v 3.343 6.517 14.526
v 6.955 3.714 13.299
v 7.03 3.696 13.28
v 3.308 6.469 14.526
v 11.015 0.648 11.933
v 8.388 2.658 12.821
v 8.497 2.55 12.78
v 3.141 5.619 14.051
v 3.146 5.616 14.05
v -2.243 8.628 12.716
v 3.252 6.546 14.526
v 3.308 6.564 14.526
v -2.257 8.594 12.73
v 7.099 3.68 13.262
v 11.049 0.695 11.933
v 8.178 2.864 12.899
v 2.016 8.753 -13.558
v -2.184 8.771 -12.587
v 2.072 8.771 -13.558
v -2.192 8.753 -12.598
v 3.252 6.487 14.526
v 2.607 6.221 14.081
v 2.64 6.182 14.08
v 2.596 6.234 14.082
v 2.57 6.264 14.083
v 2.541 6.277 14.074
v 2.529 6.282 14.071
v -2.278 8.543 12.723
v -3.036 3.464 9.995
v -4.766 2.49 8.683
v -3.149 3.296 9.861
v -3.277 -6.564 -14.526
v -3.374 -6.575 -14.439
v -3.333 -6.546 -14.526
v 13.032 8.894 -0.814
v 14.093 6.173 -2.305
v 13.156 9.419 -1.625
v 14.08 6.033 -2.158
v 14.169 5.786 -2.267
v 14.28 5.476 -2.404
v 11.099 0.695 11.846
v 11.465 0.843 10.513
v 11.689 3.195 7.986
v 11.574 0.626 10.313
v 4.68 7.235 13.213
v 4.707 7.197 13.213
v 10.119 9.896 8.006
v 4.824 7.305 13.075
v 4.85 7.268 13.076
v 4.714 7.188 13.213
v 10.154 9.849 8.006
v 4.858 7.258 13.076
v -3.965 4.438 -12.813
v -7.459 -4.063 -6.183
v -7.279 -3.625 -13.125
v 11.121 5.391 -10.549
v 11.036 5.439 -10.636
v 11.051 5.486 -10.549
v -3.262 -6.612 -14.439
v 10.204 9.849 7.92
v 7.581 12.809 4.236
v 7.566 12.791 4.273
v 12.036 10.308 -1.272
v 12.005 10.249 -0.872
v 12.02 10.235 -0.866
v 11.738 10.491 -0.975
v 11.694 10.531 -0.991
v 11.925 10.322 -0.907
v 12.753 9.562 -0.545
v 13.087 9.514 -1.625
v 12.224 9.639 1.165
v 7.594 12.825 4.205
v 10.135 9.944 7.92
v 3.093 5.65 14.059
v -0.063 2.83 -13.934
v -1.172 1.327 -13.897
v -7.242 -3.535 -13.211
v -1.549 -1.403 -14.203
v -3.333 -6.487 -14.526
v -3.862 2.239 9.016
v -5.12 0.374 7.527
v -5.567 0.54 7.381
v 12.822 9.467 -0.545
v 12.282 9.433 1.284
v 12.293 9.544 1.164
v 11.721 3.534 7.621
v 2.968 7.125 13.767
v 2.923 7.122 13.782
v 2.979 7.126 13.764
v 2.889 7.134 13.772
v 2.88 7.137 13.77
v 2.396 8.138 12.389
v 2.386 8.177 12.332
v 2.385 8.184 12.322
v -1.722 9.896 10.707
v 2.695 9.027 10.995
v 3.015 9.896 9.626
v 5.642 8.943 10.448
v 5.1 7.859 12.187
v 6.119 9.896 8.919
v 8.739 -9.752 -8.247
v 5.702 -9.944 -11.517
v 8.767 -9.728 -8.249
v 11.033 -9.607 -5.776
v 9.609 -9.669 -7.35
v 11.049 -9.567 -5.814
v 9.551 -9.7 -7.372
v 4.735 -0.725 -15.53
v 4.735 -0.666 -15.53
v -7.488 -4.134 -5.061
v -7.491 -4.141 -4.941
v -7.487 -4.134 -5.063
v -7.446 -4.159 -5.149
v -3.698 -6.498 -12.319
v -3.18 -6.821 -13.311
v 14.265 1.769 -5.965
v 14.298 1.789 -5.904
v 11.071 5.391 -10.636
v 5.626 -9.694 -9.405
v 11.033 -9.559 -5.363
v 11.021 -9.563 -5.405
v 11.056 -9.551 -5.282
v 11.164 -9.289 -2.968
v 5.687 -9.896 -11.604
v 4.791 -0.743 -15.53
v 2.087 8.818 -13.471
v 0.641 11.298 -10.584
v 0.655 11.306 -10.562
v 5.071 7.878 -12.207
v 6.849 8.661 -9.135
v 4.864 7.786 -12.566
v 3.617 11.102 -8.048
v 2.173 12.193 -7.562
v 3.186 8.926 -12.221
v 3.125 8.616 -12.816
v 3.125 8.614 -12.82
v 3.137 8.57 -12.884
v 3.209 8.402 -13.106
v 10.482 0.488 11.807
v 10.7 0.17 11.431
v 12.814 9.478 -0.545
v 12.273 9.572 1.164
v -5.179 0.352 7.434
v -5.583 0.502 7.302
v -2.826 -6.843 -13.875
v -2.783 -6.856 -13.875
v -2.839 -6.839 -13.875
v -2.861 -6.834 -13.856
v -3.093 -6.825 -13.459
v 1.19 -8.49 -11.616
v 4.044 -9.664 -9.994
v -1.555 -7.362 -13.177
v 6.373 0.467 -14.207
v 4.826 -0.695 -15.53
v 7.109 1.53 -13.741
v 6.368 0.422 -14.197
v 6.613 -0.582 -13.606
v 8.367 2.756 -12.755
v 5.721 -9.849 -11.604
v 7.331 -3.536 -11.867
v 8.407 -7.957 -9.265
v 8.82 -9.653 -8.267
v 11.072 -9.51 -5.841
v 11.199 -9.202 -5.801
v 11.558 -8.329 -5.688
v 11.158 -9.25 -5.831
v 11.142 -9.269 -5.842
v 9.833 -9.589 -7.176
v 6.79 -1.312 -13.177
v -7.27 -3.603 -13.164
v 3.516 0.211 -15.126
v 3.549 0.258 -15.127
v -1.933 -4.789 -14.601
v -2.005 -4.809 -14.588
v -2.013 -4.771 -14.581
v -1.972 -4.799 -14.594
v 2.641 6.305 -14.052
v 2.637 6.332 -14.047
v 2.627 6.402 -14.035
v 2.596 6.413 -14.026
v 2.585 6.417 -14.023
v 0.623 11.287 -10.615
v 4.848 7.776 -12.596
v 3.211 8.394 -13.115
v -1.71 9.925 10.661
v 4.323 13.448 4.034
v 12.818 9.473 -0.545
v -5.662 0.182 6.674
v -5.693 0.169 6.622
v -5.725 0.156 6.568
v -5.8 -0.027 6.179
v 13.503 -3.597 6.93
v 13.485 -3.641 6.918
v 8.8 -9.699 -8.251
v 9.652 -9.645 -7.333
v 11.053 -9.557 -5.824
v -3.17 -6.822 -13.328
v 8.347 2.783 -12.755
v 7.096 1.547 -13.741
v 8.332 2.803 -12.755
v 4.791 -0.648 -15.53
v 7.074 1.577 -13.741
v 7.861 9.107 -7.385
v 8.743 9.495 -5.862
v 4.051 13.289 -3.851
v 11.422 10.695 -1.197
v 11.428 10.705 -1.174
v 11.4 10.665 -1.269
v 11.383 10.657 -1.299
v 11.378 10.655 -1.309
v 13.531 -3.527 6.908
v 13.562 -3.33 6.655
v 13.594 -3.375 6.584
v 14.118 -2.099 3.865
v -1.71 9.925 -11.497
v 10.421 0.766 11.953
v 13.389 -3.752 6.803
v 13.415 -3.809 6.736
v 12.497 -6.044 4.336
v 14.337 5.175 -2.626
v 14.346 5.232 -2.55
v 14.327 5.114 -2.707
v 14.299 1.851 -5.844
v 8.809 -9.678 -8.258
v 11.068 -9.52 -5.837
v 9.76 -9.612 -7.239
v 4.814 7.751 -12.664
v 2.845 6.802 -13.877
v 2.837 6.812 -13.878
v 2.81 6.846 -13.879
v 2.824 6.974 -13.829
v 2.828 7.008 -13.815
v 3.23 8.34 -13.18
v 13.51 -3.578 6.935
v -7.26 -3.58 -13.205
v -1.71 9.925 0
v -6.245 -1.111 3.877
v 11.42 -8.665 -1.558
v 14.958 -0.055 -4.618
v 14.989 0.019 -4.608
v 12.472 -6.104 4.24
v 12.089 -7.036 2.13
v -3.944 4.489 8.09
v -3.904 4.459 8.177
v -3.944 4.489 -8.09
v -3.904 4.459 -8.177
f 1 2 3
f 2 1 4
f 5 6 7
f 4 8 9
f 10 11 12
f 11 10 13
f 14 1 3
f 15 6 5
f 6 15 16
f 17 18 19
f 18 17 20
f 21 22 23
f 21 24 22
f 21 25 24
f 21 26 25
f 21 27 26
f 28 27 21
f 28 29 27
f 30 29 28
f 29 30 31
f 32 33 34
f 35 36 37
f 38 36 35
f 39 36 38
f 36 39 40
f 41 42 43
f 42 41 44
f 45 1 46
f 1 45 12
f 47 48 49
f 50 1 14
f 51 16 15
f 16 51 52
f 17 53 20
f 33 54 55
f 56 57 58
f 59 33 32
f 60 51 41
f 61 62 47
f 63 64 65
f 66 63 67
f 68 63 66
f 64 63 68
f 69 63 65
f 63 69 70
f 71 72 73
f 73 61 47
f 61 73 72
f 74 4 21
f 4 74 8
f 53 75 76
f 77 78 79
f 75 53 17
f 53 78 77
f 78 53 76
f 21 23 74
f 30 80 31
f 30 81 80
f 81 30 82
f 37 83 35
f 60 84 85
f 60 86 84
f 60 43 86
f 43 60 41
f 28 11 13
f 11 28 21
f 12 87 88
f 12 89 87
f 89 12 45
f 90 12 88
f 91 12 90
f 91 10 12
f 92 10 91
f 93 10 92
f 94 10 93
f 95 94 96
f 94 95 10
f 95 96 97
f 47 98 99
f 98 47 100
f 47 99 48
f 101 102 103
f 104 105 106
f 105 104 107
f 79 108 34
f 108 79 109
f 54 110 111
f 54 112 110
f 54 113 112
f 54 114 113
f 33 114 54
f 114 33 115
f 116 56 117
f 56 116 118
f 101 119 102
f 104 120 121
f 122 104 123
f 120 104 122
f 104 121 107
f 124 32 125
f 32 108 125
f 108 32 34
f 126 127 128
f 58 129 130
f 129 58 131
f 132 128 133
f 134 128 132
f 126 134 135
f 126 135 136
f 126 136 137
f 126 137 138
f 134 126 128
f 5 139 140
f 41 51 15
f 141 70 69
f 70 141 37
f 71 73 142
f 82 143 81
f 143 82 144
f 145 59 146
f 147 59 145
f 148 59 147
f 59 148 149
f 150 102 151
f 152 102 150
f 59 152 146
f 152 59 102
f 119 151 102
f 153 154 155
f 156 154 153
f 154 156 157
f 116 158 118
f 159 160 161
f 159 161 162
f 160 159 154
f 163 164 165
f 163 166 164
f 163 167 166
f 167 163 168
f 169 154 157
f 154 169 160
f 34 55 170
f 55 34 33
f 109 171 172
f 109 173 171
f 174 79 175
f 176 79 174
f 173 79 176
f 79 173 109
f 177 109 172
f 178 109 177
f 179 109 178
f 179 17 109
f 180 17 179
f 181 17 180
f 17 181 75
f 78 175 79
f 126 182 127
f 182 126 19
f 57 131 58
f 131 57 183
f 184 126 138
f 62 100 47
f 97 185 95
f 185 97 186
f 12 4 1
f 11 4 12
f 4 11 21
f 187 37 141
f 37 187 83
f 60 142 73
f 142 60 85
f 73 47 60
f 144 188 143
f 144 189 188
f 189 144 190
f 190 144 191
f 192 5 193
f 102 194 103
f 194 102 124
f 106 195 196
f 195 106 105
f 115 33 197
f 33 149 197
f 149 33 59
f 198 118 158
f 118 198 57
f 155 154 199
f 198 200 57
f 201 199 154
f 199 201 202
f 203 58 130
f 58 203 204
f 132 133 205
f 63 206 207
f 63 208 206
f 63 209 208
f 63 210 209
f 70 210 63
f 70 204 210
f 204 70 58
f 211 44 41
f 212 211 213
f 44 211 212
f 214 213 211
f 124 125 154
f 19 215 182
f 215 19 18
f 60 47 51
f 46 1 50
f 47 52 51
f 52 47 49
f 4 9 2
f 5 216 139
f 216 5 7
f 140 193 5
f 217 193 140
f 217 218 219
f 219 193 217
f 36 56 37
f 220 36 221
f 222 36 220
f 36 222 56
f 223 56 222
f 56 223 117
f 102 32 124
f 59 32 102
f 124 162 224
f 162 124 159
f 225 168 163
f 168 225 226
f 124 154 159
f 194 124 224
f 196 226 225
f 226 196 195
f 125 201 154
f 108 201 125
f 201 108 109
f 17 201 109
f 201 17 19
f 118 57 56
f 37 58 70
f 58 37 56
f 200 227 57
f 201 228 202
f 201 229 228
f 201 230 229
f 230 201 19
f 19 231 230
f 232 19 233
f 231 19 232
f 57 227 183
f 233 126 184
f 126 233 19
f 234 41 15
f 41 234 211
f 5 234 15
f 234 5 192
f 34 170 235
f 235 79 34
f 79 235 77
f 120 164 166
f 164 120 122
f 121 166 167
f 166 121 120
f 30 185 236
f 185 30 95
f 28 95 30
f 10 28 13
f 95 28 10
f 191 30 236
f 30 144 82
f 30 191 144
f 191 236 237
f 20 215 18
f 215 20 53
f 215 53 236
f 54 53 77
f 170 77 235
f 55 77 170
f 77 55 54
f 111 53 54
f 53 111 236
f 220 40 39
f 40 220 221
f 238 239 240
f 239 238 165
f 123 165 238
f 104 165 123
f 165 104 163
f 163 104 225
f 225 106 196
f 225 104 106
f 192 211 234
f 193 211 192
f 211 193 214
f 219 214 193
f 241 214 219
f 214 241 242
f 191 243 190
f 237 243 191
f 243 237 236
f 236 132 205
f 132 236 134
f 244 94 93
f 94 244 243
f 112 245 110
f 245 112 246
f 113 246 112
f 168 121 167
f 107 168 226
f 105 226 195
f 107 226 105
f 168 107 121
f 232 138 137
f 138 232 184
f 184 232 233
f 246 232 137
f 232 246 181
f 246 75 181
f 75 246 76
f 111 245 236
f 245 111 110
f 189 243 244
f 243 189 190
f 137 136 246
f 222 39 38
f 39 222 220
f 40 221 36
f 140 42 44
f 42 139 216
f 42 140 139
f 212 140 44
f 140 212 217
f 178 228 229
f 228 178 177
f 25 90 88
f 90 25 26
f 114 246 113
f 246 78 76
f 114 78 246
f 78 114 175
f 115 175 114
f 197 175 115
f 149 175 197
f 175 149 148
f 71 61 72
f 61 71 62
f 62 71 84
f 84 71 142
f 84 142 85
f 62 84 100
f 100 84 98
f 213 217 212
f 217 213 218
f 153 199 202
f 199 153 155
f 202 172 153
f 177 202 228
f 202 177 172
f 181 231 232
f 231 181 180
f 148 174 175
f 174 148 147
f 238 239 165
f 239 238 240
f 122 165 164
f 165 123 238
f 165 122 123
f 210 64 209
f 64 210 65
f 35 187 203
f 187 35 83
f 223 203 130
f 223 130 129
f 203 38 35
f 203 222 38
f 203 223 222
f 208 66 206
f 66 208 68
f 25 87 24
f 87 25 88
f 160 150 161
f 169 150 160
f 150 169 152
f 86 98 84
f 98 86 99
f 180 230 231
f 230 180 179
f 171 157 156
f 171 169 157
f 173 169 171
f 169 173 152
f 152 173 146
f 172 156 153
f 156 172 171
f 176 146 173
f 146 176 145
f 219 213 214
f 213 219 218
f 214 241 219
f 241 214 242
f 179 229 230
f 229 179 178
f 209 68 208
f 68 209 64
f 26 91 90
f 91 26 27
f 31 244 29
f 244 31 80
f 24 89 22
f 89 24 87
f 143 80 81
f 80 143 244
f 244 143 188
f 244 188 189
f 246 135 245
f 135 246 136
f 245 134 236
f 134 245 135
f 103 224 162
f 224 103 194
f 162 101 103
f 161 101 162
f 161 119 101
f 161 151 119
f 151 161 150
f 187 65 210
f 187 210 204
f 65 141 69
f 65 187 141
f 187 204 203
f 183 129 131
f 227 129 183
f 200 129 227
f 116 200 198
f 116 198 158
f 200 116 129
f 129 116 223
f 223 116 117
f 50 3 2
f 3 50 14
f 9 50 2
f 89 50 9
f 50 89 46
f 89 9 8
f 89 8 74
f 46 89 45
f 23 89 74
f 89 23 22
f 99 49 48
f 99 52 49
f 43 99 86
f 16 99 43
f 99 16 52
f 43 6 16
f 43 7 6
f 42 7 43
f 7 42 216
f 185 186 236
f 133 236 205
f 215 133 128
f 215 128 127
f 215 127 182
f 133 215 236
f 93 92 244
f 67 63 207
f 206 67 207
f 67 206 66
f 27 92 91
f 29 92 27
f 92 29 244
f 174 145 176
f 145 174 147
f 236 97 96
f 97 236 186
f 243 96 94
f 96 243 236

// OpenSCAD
// Auto-generated OpenSCAD file

    inner_points = 10*[[1.6796923234637004e-13, 6.070021975389176e-13, -1.618033988749895], [-1.6796923234637004e-13, -6.070021975389176e-13, 1.618033988749895], [1.3099900587145907, 0.9497157652786637, 4.92274937759846e-13], [0.9497157652786637, -1.3099900587145907, -3.9284948324472034e-13], [0.948473340654347, 0.0700486920347792, -1.3090169943748227], [0.9484733406540753, 0.07004869203379704, 1.3090169943750722], [0.3615167180605155, 0.8796670732448667, -1.3090169943745797], [0.36151671806024377, 0.8796670732438845, 1.3090169943753152], [-0.36151671806024377, -0.8796670732438845, -1.3090169943753152], [-0.3615167180605155, -0.8796670732448667, 1.3090169943745797], [1.5346621026017229, 0.11334116457913979, -0.49999999999979816], [1.5346621026016192, 0.11334116457876464, 0.5000000000002018], [0.5849463373230591, 1.4233312232937305, -0.49999999999940536], [0.5849463373229553, 1.4233312232933555, 0.5000000000005946], [-0.5849463373229553, -1.4233312232933555, -0.5000000000005946], [-0.5849463373230591, -1.4233312232937305, 0.49999999999940536], [1.173145384541375, -0.7663259086651197, -0.8090169943751132], [1.1731453845412072, -0.766325908665727, 0.8090169943747817], [0.36352700333128773, -1.3532825312589511, -0.8090169943754174], [0.36352700333111987, -1.3532825312595584, 0.8090169943744775], [-0.1629176159415796, 0.9866396760803366, 3.5322329978742213e-13], [-0.7478639532645349, -0.4366915472130185, -0.5000000000002415], [-0.7478639532646387, -0.4366915472133937, 0.4999999999997586], [-0.3863472352041232, 0.4429755260314729, -0.8090169943748214], [-0.38634723520429115, 0.44297552603086593, 0.8090169943750735]];

    outer_points = 10*[[0.3292875792170331, 0.6516523075520398, 1.4439366152935462], [-0.3292875792170331, -0.6516523075520398, -1.4439366152935462], [1.5775331980706784, 0.0, -0.35975407952487837], [-0.14488853615168673, 1.4810075147722905, -0.6353408864772672], [1.0103928266975255, 0.9848542820948938, 0.7919610896675606], [0.4775943314511925, -0.06954130037160627, -1.5443774314778784], [1.0999388666194858, 0.06954130037160627, 1.184623351953], [0.5671403713731528, -0.9848542820948938, -1.151715169192439], [-0.5671403713731528, 0.9848542820948938, 1.151715169192439], [-1.0999388666194858, -0.06954130037160627, -1.184623351953], [1.3055623563686454, 0.9418753948433755, -0.16251665444403007], [1.1020514403393455, 0.5391321199289151, -1.0549185602959228], [1.450450892520332, -0.5391321199289151, 0.4728242320332371], [1.2469399764910323, -0.9418753948433755, -0.41957767381865574], [-1.2469399764910323, 0.9418753948433755, 0.41957767381865574], [-1.450450892520332, 0.5391321199289151, -0.4728242320332371], [0.5349110689661927, 1.523986402023809, 0.09679660889651609], [0.20562348974915956, 0.8723340944717692, -1.34714000639703], [-0.4400580658228066, 1.523986402023809, 0.31913685763432353], [-0.7693456450398397, 0.8723340944717692, -1.1247997576592228], [0.5161118652230368, -0.8186808191285174, 0.25177422220524803], [-0.7308281112679954, 0.12319457571485803, 0.6713518960239038], [-0.9343390272972953, -0.27954869919960235, -0.22105000982798903], [0.16559983932219047, -0.21000739882799596, 0.9635733421250111], [-0.16368773989484264, -0.8616597063800358, -0.48036327316853505]];

    // Convex hull for inner set (I)
    module inner_hull() {
        hull() {
            for (p = inner_points) {
                translate(p) sphere(r=0.1);
            }
        }
    }

    // Convex hull for outer set (O) minus inner hull (O \ I)
    module outer_minus_inner() {
        difference() {
            hull() {
                for (p = outer_points) {
                    translate(p) sphere(r=0.1);
                }
            }
            inner_hull(); // Subtract inner hull
        }
    }

    // Convex hull for outer set (O) minus all translated inner hulls
    module outer_minus_AllTranslationInner() {
        difference() {
            hull() {
                for (p = outer_points) {
                    translate(p) sphere(r=0.1);
                }
            }
            hull() {
                translate([0,0,50]) inner_hull();
                translate([0,0,-50]) inner_hull();
            }; // Subtract translated inner hulls
        }
    }

    // Difference between outer_minus_inner and outer_minus_AllTranslationInner
    module outer_minus_inner_diff() {
        difference() {
            // Outer minus inner
            difference() {
                hull() {
                    for (p = outer_points) {
                        translate(p) sphere(r=0.1);
                    }
                }
                inner_hull();
            }

            // Subtract Outer minus AllTranslationInner
            difference() {
                hull() {
                    for (p = outer_points) {
                        translate(p) sphere(r=0.1);
                    }
                }
                hull() {
                    translate([0,0,50]) inner_hull();
                    translate([0,0,-50]) inner_hull();
                };
            }
        }
    }

    // Rendering all with colors applied
    color([1, 1, 0, 1]) outer_minus_inner_diff(); // Opaque yellow
    
